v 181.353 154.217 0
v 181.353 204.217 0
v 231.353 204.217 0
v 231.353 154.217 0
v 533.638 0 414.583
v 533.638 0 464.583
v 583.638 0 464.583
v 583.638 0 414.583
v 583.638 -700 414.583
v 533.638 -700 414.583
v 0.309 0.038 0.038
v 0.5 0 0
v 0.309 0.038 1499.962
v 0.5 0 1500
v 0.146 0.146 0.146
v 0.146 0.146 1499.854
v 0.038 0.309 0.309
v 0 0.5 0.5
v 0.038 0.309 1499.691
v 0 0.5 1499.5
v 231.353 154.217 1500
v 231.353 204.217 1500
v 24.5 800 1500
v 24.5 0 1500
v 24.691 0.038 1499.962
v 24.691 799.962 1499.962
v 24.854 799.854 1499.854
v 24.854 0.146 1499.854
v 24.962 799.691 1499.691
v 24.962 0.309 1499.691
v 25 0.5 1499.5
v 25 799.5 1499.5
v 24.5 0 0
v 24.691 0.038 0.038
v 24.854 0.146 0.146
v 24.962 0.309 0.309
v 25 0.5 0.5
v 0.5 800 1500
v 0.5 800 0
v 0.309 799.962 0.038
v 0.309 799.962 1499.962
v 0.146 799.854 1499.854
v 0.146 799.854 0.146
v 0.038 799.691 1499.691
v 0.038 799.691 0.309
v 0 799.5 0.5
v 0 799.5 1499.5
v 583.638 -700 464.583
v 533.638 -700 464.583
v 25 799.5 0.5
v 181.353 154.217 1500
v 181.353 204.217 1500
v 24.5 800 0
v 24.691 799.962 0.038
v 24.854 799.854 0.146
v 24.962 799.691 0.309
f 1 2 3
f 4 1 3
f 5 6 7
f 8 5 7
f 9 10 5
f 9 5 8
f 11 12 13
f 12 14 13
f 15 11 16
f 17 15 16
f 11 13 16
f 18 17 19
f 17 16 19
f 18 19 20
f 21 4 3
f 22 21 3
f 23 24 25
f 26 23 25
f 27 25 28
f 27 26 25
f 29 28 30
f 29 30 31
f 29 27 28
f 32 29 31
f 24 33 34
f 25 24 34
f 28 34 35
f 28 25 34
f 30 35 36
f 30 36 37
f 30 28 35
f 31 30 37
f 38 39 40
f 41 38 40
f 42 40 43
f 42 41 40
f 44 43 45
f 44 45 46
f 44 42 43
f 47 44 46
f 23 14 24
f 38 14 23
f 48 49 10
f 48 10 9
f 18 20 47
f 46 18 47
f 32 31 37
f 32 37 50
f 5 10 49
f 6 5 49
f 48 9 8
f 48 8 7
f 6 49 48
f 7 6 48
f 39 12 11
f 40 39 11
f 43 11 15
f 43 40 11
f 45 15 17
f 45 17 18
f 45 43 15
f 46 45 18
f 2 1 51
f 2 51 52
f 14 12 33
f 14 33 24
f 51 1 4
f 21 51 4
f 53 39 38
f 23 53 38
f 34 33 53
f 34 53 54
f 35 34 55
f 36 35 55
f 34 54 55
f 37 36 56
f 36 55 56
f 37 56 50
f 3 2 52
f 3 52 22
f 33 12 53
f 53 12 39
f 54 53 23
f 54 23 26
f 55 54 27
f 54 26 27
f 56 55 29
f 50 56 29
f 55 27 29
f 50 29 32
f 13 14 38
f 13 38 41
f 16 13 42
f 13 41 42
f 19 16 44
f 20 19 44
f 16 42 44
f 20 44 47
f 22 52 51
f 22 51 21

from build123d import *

# Parameters (mm, degrees)
F0_W     = 800
F0_H     = 1500
F1_DEPTH = 25
F2_R     = 0.5
F3_W     = 50
F3_H     = 50
F4_DEPTH = 1500
F5_W     = 50
F5_H     = 50
F6_DEPTH = 700


with BuildPart() as f1:
    # F0 (on Right) → F1 (new body)
    with BuildSketch(Plane.YZ):
        with Locations((400, 750)):
            Rectangle(F0_W, F0_H)
    extrude(amount=F1_DEPTH)

    # F2
    f2_edges = [f1.edges().sort_by_distance(p)[0] for p in [
        (25, 400, 1500),
        (25, 0, 750),
        (25, 400, 0),
        (25, 800, 750),
        (0, 800, 750),
        (0, 400, 0),
        (0, 400, 1500),
        (0, 0, 750),
    ]]
    fillet(f2_edges, radius=F2_R)


with BuildPart() as f4:
    # F3 (on Top) → F4 (new body)
    with BuildSketch(Plane.XY):
        with Locations((206.352584, 179.217196)):
            Rectangle(F3_W, F3_H)
    extrude(amount=F4_DEPTH)


with BuildPart() as f6:
    # F5 (on Front) → F6 (new body)
    with BuildSketch(Plane.XZ):
        with Locations((558.637857, 439.582881)):
            Rectangle(F5_W, F5_H)
    extrude(amount=F6_DEPTH)


solid = Compound([f1.part, f4.part, f6.part])
